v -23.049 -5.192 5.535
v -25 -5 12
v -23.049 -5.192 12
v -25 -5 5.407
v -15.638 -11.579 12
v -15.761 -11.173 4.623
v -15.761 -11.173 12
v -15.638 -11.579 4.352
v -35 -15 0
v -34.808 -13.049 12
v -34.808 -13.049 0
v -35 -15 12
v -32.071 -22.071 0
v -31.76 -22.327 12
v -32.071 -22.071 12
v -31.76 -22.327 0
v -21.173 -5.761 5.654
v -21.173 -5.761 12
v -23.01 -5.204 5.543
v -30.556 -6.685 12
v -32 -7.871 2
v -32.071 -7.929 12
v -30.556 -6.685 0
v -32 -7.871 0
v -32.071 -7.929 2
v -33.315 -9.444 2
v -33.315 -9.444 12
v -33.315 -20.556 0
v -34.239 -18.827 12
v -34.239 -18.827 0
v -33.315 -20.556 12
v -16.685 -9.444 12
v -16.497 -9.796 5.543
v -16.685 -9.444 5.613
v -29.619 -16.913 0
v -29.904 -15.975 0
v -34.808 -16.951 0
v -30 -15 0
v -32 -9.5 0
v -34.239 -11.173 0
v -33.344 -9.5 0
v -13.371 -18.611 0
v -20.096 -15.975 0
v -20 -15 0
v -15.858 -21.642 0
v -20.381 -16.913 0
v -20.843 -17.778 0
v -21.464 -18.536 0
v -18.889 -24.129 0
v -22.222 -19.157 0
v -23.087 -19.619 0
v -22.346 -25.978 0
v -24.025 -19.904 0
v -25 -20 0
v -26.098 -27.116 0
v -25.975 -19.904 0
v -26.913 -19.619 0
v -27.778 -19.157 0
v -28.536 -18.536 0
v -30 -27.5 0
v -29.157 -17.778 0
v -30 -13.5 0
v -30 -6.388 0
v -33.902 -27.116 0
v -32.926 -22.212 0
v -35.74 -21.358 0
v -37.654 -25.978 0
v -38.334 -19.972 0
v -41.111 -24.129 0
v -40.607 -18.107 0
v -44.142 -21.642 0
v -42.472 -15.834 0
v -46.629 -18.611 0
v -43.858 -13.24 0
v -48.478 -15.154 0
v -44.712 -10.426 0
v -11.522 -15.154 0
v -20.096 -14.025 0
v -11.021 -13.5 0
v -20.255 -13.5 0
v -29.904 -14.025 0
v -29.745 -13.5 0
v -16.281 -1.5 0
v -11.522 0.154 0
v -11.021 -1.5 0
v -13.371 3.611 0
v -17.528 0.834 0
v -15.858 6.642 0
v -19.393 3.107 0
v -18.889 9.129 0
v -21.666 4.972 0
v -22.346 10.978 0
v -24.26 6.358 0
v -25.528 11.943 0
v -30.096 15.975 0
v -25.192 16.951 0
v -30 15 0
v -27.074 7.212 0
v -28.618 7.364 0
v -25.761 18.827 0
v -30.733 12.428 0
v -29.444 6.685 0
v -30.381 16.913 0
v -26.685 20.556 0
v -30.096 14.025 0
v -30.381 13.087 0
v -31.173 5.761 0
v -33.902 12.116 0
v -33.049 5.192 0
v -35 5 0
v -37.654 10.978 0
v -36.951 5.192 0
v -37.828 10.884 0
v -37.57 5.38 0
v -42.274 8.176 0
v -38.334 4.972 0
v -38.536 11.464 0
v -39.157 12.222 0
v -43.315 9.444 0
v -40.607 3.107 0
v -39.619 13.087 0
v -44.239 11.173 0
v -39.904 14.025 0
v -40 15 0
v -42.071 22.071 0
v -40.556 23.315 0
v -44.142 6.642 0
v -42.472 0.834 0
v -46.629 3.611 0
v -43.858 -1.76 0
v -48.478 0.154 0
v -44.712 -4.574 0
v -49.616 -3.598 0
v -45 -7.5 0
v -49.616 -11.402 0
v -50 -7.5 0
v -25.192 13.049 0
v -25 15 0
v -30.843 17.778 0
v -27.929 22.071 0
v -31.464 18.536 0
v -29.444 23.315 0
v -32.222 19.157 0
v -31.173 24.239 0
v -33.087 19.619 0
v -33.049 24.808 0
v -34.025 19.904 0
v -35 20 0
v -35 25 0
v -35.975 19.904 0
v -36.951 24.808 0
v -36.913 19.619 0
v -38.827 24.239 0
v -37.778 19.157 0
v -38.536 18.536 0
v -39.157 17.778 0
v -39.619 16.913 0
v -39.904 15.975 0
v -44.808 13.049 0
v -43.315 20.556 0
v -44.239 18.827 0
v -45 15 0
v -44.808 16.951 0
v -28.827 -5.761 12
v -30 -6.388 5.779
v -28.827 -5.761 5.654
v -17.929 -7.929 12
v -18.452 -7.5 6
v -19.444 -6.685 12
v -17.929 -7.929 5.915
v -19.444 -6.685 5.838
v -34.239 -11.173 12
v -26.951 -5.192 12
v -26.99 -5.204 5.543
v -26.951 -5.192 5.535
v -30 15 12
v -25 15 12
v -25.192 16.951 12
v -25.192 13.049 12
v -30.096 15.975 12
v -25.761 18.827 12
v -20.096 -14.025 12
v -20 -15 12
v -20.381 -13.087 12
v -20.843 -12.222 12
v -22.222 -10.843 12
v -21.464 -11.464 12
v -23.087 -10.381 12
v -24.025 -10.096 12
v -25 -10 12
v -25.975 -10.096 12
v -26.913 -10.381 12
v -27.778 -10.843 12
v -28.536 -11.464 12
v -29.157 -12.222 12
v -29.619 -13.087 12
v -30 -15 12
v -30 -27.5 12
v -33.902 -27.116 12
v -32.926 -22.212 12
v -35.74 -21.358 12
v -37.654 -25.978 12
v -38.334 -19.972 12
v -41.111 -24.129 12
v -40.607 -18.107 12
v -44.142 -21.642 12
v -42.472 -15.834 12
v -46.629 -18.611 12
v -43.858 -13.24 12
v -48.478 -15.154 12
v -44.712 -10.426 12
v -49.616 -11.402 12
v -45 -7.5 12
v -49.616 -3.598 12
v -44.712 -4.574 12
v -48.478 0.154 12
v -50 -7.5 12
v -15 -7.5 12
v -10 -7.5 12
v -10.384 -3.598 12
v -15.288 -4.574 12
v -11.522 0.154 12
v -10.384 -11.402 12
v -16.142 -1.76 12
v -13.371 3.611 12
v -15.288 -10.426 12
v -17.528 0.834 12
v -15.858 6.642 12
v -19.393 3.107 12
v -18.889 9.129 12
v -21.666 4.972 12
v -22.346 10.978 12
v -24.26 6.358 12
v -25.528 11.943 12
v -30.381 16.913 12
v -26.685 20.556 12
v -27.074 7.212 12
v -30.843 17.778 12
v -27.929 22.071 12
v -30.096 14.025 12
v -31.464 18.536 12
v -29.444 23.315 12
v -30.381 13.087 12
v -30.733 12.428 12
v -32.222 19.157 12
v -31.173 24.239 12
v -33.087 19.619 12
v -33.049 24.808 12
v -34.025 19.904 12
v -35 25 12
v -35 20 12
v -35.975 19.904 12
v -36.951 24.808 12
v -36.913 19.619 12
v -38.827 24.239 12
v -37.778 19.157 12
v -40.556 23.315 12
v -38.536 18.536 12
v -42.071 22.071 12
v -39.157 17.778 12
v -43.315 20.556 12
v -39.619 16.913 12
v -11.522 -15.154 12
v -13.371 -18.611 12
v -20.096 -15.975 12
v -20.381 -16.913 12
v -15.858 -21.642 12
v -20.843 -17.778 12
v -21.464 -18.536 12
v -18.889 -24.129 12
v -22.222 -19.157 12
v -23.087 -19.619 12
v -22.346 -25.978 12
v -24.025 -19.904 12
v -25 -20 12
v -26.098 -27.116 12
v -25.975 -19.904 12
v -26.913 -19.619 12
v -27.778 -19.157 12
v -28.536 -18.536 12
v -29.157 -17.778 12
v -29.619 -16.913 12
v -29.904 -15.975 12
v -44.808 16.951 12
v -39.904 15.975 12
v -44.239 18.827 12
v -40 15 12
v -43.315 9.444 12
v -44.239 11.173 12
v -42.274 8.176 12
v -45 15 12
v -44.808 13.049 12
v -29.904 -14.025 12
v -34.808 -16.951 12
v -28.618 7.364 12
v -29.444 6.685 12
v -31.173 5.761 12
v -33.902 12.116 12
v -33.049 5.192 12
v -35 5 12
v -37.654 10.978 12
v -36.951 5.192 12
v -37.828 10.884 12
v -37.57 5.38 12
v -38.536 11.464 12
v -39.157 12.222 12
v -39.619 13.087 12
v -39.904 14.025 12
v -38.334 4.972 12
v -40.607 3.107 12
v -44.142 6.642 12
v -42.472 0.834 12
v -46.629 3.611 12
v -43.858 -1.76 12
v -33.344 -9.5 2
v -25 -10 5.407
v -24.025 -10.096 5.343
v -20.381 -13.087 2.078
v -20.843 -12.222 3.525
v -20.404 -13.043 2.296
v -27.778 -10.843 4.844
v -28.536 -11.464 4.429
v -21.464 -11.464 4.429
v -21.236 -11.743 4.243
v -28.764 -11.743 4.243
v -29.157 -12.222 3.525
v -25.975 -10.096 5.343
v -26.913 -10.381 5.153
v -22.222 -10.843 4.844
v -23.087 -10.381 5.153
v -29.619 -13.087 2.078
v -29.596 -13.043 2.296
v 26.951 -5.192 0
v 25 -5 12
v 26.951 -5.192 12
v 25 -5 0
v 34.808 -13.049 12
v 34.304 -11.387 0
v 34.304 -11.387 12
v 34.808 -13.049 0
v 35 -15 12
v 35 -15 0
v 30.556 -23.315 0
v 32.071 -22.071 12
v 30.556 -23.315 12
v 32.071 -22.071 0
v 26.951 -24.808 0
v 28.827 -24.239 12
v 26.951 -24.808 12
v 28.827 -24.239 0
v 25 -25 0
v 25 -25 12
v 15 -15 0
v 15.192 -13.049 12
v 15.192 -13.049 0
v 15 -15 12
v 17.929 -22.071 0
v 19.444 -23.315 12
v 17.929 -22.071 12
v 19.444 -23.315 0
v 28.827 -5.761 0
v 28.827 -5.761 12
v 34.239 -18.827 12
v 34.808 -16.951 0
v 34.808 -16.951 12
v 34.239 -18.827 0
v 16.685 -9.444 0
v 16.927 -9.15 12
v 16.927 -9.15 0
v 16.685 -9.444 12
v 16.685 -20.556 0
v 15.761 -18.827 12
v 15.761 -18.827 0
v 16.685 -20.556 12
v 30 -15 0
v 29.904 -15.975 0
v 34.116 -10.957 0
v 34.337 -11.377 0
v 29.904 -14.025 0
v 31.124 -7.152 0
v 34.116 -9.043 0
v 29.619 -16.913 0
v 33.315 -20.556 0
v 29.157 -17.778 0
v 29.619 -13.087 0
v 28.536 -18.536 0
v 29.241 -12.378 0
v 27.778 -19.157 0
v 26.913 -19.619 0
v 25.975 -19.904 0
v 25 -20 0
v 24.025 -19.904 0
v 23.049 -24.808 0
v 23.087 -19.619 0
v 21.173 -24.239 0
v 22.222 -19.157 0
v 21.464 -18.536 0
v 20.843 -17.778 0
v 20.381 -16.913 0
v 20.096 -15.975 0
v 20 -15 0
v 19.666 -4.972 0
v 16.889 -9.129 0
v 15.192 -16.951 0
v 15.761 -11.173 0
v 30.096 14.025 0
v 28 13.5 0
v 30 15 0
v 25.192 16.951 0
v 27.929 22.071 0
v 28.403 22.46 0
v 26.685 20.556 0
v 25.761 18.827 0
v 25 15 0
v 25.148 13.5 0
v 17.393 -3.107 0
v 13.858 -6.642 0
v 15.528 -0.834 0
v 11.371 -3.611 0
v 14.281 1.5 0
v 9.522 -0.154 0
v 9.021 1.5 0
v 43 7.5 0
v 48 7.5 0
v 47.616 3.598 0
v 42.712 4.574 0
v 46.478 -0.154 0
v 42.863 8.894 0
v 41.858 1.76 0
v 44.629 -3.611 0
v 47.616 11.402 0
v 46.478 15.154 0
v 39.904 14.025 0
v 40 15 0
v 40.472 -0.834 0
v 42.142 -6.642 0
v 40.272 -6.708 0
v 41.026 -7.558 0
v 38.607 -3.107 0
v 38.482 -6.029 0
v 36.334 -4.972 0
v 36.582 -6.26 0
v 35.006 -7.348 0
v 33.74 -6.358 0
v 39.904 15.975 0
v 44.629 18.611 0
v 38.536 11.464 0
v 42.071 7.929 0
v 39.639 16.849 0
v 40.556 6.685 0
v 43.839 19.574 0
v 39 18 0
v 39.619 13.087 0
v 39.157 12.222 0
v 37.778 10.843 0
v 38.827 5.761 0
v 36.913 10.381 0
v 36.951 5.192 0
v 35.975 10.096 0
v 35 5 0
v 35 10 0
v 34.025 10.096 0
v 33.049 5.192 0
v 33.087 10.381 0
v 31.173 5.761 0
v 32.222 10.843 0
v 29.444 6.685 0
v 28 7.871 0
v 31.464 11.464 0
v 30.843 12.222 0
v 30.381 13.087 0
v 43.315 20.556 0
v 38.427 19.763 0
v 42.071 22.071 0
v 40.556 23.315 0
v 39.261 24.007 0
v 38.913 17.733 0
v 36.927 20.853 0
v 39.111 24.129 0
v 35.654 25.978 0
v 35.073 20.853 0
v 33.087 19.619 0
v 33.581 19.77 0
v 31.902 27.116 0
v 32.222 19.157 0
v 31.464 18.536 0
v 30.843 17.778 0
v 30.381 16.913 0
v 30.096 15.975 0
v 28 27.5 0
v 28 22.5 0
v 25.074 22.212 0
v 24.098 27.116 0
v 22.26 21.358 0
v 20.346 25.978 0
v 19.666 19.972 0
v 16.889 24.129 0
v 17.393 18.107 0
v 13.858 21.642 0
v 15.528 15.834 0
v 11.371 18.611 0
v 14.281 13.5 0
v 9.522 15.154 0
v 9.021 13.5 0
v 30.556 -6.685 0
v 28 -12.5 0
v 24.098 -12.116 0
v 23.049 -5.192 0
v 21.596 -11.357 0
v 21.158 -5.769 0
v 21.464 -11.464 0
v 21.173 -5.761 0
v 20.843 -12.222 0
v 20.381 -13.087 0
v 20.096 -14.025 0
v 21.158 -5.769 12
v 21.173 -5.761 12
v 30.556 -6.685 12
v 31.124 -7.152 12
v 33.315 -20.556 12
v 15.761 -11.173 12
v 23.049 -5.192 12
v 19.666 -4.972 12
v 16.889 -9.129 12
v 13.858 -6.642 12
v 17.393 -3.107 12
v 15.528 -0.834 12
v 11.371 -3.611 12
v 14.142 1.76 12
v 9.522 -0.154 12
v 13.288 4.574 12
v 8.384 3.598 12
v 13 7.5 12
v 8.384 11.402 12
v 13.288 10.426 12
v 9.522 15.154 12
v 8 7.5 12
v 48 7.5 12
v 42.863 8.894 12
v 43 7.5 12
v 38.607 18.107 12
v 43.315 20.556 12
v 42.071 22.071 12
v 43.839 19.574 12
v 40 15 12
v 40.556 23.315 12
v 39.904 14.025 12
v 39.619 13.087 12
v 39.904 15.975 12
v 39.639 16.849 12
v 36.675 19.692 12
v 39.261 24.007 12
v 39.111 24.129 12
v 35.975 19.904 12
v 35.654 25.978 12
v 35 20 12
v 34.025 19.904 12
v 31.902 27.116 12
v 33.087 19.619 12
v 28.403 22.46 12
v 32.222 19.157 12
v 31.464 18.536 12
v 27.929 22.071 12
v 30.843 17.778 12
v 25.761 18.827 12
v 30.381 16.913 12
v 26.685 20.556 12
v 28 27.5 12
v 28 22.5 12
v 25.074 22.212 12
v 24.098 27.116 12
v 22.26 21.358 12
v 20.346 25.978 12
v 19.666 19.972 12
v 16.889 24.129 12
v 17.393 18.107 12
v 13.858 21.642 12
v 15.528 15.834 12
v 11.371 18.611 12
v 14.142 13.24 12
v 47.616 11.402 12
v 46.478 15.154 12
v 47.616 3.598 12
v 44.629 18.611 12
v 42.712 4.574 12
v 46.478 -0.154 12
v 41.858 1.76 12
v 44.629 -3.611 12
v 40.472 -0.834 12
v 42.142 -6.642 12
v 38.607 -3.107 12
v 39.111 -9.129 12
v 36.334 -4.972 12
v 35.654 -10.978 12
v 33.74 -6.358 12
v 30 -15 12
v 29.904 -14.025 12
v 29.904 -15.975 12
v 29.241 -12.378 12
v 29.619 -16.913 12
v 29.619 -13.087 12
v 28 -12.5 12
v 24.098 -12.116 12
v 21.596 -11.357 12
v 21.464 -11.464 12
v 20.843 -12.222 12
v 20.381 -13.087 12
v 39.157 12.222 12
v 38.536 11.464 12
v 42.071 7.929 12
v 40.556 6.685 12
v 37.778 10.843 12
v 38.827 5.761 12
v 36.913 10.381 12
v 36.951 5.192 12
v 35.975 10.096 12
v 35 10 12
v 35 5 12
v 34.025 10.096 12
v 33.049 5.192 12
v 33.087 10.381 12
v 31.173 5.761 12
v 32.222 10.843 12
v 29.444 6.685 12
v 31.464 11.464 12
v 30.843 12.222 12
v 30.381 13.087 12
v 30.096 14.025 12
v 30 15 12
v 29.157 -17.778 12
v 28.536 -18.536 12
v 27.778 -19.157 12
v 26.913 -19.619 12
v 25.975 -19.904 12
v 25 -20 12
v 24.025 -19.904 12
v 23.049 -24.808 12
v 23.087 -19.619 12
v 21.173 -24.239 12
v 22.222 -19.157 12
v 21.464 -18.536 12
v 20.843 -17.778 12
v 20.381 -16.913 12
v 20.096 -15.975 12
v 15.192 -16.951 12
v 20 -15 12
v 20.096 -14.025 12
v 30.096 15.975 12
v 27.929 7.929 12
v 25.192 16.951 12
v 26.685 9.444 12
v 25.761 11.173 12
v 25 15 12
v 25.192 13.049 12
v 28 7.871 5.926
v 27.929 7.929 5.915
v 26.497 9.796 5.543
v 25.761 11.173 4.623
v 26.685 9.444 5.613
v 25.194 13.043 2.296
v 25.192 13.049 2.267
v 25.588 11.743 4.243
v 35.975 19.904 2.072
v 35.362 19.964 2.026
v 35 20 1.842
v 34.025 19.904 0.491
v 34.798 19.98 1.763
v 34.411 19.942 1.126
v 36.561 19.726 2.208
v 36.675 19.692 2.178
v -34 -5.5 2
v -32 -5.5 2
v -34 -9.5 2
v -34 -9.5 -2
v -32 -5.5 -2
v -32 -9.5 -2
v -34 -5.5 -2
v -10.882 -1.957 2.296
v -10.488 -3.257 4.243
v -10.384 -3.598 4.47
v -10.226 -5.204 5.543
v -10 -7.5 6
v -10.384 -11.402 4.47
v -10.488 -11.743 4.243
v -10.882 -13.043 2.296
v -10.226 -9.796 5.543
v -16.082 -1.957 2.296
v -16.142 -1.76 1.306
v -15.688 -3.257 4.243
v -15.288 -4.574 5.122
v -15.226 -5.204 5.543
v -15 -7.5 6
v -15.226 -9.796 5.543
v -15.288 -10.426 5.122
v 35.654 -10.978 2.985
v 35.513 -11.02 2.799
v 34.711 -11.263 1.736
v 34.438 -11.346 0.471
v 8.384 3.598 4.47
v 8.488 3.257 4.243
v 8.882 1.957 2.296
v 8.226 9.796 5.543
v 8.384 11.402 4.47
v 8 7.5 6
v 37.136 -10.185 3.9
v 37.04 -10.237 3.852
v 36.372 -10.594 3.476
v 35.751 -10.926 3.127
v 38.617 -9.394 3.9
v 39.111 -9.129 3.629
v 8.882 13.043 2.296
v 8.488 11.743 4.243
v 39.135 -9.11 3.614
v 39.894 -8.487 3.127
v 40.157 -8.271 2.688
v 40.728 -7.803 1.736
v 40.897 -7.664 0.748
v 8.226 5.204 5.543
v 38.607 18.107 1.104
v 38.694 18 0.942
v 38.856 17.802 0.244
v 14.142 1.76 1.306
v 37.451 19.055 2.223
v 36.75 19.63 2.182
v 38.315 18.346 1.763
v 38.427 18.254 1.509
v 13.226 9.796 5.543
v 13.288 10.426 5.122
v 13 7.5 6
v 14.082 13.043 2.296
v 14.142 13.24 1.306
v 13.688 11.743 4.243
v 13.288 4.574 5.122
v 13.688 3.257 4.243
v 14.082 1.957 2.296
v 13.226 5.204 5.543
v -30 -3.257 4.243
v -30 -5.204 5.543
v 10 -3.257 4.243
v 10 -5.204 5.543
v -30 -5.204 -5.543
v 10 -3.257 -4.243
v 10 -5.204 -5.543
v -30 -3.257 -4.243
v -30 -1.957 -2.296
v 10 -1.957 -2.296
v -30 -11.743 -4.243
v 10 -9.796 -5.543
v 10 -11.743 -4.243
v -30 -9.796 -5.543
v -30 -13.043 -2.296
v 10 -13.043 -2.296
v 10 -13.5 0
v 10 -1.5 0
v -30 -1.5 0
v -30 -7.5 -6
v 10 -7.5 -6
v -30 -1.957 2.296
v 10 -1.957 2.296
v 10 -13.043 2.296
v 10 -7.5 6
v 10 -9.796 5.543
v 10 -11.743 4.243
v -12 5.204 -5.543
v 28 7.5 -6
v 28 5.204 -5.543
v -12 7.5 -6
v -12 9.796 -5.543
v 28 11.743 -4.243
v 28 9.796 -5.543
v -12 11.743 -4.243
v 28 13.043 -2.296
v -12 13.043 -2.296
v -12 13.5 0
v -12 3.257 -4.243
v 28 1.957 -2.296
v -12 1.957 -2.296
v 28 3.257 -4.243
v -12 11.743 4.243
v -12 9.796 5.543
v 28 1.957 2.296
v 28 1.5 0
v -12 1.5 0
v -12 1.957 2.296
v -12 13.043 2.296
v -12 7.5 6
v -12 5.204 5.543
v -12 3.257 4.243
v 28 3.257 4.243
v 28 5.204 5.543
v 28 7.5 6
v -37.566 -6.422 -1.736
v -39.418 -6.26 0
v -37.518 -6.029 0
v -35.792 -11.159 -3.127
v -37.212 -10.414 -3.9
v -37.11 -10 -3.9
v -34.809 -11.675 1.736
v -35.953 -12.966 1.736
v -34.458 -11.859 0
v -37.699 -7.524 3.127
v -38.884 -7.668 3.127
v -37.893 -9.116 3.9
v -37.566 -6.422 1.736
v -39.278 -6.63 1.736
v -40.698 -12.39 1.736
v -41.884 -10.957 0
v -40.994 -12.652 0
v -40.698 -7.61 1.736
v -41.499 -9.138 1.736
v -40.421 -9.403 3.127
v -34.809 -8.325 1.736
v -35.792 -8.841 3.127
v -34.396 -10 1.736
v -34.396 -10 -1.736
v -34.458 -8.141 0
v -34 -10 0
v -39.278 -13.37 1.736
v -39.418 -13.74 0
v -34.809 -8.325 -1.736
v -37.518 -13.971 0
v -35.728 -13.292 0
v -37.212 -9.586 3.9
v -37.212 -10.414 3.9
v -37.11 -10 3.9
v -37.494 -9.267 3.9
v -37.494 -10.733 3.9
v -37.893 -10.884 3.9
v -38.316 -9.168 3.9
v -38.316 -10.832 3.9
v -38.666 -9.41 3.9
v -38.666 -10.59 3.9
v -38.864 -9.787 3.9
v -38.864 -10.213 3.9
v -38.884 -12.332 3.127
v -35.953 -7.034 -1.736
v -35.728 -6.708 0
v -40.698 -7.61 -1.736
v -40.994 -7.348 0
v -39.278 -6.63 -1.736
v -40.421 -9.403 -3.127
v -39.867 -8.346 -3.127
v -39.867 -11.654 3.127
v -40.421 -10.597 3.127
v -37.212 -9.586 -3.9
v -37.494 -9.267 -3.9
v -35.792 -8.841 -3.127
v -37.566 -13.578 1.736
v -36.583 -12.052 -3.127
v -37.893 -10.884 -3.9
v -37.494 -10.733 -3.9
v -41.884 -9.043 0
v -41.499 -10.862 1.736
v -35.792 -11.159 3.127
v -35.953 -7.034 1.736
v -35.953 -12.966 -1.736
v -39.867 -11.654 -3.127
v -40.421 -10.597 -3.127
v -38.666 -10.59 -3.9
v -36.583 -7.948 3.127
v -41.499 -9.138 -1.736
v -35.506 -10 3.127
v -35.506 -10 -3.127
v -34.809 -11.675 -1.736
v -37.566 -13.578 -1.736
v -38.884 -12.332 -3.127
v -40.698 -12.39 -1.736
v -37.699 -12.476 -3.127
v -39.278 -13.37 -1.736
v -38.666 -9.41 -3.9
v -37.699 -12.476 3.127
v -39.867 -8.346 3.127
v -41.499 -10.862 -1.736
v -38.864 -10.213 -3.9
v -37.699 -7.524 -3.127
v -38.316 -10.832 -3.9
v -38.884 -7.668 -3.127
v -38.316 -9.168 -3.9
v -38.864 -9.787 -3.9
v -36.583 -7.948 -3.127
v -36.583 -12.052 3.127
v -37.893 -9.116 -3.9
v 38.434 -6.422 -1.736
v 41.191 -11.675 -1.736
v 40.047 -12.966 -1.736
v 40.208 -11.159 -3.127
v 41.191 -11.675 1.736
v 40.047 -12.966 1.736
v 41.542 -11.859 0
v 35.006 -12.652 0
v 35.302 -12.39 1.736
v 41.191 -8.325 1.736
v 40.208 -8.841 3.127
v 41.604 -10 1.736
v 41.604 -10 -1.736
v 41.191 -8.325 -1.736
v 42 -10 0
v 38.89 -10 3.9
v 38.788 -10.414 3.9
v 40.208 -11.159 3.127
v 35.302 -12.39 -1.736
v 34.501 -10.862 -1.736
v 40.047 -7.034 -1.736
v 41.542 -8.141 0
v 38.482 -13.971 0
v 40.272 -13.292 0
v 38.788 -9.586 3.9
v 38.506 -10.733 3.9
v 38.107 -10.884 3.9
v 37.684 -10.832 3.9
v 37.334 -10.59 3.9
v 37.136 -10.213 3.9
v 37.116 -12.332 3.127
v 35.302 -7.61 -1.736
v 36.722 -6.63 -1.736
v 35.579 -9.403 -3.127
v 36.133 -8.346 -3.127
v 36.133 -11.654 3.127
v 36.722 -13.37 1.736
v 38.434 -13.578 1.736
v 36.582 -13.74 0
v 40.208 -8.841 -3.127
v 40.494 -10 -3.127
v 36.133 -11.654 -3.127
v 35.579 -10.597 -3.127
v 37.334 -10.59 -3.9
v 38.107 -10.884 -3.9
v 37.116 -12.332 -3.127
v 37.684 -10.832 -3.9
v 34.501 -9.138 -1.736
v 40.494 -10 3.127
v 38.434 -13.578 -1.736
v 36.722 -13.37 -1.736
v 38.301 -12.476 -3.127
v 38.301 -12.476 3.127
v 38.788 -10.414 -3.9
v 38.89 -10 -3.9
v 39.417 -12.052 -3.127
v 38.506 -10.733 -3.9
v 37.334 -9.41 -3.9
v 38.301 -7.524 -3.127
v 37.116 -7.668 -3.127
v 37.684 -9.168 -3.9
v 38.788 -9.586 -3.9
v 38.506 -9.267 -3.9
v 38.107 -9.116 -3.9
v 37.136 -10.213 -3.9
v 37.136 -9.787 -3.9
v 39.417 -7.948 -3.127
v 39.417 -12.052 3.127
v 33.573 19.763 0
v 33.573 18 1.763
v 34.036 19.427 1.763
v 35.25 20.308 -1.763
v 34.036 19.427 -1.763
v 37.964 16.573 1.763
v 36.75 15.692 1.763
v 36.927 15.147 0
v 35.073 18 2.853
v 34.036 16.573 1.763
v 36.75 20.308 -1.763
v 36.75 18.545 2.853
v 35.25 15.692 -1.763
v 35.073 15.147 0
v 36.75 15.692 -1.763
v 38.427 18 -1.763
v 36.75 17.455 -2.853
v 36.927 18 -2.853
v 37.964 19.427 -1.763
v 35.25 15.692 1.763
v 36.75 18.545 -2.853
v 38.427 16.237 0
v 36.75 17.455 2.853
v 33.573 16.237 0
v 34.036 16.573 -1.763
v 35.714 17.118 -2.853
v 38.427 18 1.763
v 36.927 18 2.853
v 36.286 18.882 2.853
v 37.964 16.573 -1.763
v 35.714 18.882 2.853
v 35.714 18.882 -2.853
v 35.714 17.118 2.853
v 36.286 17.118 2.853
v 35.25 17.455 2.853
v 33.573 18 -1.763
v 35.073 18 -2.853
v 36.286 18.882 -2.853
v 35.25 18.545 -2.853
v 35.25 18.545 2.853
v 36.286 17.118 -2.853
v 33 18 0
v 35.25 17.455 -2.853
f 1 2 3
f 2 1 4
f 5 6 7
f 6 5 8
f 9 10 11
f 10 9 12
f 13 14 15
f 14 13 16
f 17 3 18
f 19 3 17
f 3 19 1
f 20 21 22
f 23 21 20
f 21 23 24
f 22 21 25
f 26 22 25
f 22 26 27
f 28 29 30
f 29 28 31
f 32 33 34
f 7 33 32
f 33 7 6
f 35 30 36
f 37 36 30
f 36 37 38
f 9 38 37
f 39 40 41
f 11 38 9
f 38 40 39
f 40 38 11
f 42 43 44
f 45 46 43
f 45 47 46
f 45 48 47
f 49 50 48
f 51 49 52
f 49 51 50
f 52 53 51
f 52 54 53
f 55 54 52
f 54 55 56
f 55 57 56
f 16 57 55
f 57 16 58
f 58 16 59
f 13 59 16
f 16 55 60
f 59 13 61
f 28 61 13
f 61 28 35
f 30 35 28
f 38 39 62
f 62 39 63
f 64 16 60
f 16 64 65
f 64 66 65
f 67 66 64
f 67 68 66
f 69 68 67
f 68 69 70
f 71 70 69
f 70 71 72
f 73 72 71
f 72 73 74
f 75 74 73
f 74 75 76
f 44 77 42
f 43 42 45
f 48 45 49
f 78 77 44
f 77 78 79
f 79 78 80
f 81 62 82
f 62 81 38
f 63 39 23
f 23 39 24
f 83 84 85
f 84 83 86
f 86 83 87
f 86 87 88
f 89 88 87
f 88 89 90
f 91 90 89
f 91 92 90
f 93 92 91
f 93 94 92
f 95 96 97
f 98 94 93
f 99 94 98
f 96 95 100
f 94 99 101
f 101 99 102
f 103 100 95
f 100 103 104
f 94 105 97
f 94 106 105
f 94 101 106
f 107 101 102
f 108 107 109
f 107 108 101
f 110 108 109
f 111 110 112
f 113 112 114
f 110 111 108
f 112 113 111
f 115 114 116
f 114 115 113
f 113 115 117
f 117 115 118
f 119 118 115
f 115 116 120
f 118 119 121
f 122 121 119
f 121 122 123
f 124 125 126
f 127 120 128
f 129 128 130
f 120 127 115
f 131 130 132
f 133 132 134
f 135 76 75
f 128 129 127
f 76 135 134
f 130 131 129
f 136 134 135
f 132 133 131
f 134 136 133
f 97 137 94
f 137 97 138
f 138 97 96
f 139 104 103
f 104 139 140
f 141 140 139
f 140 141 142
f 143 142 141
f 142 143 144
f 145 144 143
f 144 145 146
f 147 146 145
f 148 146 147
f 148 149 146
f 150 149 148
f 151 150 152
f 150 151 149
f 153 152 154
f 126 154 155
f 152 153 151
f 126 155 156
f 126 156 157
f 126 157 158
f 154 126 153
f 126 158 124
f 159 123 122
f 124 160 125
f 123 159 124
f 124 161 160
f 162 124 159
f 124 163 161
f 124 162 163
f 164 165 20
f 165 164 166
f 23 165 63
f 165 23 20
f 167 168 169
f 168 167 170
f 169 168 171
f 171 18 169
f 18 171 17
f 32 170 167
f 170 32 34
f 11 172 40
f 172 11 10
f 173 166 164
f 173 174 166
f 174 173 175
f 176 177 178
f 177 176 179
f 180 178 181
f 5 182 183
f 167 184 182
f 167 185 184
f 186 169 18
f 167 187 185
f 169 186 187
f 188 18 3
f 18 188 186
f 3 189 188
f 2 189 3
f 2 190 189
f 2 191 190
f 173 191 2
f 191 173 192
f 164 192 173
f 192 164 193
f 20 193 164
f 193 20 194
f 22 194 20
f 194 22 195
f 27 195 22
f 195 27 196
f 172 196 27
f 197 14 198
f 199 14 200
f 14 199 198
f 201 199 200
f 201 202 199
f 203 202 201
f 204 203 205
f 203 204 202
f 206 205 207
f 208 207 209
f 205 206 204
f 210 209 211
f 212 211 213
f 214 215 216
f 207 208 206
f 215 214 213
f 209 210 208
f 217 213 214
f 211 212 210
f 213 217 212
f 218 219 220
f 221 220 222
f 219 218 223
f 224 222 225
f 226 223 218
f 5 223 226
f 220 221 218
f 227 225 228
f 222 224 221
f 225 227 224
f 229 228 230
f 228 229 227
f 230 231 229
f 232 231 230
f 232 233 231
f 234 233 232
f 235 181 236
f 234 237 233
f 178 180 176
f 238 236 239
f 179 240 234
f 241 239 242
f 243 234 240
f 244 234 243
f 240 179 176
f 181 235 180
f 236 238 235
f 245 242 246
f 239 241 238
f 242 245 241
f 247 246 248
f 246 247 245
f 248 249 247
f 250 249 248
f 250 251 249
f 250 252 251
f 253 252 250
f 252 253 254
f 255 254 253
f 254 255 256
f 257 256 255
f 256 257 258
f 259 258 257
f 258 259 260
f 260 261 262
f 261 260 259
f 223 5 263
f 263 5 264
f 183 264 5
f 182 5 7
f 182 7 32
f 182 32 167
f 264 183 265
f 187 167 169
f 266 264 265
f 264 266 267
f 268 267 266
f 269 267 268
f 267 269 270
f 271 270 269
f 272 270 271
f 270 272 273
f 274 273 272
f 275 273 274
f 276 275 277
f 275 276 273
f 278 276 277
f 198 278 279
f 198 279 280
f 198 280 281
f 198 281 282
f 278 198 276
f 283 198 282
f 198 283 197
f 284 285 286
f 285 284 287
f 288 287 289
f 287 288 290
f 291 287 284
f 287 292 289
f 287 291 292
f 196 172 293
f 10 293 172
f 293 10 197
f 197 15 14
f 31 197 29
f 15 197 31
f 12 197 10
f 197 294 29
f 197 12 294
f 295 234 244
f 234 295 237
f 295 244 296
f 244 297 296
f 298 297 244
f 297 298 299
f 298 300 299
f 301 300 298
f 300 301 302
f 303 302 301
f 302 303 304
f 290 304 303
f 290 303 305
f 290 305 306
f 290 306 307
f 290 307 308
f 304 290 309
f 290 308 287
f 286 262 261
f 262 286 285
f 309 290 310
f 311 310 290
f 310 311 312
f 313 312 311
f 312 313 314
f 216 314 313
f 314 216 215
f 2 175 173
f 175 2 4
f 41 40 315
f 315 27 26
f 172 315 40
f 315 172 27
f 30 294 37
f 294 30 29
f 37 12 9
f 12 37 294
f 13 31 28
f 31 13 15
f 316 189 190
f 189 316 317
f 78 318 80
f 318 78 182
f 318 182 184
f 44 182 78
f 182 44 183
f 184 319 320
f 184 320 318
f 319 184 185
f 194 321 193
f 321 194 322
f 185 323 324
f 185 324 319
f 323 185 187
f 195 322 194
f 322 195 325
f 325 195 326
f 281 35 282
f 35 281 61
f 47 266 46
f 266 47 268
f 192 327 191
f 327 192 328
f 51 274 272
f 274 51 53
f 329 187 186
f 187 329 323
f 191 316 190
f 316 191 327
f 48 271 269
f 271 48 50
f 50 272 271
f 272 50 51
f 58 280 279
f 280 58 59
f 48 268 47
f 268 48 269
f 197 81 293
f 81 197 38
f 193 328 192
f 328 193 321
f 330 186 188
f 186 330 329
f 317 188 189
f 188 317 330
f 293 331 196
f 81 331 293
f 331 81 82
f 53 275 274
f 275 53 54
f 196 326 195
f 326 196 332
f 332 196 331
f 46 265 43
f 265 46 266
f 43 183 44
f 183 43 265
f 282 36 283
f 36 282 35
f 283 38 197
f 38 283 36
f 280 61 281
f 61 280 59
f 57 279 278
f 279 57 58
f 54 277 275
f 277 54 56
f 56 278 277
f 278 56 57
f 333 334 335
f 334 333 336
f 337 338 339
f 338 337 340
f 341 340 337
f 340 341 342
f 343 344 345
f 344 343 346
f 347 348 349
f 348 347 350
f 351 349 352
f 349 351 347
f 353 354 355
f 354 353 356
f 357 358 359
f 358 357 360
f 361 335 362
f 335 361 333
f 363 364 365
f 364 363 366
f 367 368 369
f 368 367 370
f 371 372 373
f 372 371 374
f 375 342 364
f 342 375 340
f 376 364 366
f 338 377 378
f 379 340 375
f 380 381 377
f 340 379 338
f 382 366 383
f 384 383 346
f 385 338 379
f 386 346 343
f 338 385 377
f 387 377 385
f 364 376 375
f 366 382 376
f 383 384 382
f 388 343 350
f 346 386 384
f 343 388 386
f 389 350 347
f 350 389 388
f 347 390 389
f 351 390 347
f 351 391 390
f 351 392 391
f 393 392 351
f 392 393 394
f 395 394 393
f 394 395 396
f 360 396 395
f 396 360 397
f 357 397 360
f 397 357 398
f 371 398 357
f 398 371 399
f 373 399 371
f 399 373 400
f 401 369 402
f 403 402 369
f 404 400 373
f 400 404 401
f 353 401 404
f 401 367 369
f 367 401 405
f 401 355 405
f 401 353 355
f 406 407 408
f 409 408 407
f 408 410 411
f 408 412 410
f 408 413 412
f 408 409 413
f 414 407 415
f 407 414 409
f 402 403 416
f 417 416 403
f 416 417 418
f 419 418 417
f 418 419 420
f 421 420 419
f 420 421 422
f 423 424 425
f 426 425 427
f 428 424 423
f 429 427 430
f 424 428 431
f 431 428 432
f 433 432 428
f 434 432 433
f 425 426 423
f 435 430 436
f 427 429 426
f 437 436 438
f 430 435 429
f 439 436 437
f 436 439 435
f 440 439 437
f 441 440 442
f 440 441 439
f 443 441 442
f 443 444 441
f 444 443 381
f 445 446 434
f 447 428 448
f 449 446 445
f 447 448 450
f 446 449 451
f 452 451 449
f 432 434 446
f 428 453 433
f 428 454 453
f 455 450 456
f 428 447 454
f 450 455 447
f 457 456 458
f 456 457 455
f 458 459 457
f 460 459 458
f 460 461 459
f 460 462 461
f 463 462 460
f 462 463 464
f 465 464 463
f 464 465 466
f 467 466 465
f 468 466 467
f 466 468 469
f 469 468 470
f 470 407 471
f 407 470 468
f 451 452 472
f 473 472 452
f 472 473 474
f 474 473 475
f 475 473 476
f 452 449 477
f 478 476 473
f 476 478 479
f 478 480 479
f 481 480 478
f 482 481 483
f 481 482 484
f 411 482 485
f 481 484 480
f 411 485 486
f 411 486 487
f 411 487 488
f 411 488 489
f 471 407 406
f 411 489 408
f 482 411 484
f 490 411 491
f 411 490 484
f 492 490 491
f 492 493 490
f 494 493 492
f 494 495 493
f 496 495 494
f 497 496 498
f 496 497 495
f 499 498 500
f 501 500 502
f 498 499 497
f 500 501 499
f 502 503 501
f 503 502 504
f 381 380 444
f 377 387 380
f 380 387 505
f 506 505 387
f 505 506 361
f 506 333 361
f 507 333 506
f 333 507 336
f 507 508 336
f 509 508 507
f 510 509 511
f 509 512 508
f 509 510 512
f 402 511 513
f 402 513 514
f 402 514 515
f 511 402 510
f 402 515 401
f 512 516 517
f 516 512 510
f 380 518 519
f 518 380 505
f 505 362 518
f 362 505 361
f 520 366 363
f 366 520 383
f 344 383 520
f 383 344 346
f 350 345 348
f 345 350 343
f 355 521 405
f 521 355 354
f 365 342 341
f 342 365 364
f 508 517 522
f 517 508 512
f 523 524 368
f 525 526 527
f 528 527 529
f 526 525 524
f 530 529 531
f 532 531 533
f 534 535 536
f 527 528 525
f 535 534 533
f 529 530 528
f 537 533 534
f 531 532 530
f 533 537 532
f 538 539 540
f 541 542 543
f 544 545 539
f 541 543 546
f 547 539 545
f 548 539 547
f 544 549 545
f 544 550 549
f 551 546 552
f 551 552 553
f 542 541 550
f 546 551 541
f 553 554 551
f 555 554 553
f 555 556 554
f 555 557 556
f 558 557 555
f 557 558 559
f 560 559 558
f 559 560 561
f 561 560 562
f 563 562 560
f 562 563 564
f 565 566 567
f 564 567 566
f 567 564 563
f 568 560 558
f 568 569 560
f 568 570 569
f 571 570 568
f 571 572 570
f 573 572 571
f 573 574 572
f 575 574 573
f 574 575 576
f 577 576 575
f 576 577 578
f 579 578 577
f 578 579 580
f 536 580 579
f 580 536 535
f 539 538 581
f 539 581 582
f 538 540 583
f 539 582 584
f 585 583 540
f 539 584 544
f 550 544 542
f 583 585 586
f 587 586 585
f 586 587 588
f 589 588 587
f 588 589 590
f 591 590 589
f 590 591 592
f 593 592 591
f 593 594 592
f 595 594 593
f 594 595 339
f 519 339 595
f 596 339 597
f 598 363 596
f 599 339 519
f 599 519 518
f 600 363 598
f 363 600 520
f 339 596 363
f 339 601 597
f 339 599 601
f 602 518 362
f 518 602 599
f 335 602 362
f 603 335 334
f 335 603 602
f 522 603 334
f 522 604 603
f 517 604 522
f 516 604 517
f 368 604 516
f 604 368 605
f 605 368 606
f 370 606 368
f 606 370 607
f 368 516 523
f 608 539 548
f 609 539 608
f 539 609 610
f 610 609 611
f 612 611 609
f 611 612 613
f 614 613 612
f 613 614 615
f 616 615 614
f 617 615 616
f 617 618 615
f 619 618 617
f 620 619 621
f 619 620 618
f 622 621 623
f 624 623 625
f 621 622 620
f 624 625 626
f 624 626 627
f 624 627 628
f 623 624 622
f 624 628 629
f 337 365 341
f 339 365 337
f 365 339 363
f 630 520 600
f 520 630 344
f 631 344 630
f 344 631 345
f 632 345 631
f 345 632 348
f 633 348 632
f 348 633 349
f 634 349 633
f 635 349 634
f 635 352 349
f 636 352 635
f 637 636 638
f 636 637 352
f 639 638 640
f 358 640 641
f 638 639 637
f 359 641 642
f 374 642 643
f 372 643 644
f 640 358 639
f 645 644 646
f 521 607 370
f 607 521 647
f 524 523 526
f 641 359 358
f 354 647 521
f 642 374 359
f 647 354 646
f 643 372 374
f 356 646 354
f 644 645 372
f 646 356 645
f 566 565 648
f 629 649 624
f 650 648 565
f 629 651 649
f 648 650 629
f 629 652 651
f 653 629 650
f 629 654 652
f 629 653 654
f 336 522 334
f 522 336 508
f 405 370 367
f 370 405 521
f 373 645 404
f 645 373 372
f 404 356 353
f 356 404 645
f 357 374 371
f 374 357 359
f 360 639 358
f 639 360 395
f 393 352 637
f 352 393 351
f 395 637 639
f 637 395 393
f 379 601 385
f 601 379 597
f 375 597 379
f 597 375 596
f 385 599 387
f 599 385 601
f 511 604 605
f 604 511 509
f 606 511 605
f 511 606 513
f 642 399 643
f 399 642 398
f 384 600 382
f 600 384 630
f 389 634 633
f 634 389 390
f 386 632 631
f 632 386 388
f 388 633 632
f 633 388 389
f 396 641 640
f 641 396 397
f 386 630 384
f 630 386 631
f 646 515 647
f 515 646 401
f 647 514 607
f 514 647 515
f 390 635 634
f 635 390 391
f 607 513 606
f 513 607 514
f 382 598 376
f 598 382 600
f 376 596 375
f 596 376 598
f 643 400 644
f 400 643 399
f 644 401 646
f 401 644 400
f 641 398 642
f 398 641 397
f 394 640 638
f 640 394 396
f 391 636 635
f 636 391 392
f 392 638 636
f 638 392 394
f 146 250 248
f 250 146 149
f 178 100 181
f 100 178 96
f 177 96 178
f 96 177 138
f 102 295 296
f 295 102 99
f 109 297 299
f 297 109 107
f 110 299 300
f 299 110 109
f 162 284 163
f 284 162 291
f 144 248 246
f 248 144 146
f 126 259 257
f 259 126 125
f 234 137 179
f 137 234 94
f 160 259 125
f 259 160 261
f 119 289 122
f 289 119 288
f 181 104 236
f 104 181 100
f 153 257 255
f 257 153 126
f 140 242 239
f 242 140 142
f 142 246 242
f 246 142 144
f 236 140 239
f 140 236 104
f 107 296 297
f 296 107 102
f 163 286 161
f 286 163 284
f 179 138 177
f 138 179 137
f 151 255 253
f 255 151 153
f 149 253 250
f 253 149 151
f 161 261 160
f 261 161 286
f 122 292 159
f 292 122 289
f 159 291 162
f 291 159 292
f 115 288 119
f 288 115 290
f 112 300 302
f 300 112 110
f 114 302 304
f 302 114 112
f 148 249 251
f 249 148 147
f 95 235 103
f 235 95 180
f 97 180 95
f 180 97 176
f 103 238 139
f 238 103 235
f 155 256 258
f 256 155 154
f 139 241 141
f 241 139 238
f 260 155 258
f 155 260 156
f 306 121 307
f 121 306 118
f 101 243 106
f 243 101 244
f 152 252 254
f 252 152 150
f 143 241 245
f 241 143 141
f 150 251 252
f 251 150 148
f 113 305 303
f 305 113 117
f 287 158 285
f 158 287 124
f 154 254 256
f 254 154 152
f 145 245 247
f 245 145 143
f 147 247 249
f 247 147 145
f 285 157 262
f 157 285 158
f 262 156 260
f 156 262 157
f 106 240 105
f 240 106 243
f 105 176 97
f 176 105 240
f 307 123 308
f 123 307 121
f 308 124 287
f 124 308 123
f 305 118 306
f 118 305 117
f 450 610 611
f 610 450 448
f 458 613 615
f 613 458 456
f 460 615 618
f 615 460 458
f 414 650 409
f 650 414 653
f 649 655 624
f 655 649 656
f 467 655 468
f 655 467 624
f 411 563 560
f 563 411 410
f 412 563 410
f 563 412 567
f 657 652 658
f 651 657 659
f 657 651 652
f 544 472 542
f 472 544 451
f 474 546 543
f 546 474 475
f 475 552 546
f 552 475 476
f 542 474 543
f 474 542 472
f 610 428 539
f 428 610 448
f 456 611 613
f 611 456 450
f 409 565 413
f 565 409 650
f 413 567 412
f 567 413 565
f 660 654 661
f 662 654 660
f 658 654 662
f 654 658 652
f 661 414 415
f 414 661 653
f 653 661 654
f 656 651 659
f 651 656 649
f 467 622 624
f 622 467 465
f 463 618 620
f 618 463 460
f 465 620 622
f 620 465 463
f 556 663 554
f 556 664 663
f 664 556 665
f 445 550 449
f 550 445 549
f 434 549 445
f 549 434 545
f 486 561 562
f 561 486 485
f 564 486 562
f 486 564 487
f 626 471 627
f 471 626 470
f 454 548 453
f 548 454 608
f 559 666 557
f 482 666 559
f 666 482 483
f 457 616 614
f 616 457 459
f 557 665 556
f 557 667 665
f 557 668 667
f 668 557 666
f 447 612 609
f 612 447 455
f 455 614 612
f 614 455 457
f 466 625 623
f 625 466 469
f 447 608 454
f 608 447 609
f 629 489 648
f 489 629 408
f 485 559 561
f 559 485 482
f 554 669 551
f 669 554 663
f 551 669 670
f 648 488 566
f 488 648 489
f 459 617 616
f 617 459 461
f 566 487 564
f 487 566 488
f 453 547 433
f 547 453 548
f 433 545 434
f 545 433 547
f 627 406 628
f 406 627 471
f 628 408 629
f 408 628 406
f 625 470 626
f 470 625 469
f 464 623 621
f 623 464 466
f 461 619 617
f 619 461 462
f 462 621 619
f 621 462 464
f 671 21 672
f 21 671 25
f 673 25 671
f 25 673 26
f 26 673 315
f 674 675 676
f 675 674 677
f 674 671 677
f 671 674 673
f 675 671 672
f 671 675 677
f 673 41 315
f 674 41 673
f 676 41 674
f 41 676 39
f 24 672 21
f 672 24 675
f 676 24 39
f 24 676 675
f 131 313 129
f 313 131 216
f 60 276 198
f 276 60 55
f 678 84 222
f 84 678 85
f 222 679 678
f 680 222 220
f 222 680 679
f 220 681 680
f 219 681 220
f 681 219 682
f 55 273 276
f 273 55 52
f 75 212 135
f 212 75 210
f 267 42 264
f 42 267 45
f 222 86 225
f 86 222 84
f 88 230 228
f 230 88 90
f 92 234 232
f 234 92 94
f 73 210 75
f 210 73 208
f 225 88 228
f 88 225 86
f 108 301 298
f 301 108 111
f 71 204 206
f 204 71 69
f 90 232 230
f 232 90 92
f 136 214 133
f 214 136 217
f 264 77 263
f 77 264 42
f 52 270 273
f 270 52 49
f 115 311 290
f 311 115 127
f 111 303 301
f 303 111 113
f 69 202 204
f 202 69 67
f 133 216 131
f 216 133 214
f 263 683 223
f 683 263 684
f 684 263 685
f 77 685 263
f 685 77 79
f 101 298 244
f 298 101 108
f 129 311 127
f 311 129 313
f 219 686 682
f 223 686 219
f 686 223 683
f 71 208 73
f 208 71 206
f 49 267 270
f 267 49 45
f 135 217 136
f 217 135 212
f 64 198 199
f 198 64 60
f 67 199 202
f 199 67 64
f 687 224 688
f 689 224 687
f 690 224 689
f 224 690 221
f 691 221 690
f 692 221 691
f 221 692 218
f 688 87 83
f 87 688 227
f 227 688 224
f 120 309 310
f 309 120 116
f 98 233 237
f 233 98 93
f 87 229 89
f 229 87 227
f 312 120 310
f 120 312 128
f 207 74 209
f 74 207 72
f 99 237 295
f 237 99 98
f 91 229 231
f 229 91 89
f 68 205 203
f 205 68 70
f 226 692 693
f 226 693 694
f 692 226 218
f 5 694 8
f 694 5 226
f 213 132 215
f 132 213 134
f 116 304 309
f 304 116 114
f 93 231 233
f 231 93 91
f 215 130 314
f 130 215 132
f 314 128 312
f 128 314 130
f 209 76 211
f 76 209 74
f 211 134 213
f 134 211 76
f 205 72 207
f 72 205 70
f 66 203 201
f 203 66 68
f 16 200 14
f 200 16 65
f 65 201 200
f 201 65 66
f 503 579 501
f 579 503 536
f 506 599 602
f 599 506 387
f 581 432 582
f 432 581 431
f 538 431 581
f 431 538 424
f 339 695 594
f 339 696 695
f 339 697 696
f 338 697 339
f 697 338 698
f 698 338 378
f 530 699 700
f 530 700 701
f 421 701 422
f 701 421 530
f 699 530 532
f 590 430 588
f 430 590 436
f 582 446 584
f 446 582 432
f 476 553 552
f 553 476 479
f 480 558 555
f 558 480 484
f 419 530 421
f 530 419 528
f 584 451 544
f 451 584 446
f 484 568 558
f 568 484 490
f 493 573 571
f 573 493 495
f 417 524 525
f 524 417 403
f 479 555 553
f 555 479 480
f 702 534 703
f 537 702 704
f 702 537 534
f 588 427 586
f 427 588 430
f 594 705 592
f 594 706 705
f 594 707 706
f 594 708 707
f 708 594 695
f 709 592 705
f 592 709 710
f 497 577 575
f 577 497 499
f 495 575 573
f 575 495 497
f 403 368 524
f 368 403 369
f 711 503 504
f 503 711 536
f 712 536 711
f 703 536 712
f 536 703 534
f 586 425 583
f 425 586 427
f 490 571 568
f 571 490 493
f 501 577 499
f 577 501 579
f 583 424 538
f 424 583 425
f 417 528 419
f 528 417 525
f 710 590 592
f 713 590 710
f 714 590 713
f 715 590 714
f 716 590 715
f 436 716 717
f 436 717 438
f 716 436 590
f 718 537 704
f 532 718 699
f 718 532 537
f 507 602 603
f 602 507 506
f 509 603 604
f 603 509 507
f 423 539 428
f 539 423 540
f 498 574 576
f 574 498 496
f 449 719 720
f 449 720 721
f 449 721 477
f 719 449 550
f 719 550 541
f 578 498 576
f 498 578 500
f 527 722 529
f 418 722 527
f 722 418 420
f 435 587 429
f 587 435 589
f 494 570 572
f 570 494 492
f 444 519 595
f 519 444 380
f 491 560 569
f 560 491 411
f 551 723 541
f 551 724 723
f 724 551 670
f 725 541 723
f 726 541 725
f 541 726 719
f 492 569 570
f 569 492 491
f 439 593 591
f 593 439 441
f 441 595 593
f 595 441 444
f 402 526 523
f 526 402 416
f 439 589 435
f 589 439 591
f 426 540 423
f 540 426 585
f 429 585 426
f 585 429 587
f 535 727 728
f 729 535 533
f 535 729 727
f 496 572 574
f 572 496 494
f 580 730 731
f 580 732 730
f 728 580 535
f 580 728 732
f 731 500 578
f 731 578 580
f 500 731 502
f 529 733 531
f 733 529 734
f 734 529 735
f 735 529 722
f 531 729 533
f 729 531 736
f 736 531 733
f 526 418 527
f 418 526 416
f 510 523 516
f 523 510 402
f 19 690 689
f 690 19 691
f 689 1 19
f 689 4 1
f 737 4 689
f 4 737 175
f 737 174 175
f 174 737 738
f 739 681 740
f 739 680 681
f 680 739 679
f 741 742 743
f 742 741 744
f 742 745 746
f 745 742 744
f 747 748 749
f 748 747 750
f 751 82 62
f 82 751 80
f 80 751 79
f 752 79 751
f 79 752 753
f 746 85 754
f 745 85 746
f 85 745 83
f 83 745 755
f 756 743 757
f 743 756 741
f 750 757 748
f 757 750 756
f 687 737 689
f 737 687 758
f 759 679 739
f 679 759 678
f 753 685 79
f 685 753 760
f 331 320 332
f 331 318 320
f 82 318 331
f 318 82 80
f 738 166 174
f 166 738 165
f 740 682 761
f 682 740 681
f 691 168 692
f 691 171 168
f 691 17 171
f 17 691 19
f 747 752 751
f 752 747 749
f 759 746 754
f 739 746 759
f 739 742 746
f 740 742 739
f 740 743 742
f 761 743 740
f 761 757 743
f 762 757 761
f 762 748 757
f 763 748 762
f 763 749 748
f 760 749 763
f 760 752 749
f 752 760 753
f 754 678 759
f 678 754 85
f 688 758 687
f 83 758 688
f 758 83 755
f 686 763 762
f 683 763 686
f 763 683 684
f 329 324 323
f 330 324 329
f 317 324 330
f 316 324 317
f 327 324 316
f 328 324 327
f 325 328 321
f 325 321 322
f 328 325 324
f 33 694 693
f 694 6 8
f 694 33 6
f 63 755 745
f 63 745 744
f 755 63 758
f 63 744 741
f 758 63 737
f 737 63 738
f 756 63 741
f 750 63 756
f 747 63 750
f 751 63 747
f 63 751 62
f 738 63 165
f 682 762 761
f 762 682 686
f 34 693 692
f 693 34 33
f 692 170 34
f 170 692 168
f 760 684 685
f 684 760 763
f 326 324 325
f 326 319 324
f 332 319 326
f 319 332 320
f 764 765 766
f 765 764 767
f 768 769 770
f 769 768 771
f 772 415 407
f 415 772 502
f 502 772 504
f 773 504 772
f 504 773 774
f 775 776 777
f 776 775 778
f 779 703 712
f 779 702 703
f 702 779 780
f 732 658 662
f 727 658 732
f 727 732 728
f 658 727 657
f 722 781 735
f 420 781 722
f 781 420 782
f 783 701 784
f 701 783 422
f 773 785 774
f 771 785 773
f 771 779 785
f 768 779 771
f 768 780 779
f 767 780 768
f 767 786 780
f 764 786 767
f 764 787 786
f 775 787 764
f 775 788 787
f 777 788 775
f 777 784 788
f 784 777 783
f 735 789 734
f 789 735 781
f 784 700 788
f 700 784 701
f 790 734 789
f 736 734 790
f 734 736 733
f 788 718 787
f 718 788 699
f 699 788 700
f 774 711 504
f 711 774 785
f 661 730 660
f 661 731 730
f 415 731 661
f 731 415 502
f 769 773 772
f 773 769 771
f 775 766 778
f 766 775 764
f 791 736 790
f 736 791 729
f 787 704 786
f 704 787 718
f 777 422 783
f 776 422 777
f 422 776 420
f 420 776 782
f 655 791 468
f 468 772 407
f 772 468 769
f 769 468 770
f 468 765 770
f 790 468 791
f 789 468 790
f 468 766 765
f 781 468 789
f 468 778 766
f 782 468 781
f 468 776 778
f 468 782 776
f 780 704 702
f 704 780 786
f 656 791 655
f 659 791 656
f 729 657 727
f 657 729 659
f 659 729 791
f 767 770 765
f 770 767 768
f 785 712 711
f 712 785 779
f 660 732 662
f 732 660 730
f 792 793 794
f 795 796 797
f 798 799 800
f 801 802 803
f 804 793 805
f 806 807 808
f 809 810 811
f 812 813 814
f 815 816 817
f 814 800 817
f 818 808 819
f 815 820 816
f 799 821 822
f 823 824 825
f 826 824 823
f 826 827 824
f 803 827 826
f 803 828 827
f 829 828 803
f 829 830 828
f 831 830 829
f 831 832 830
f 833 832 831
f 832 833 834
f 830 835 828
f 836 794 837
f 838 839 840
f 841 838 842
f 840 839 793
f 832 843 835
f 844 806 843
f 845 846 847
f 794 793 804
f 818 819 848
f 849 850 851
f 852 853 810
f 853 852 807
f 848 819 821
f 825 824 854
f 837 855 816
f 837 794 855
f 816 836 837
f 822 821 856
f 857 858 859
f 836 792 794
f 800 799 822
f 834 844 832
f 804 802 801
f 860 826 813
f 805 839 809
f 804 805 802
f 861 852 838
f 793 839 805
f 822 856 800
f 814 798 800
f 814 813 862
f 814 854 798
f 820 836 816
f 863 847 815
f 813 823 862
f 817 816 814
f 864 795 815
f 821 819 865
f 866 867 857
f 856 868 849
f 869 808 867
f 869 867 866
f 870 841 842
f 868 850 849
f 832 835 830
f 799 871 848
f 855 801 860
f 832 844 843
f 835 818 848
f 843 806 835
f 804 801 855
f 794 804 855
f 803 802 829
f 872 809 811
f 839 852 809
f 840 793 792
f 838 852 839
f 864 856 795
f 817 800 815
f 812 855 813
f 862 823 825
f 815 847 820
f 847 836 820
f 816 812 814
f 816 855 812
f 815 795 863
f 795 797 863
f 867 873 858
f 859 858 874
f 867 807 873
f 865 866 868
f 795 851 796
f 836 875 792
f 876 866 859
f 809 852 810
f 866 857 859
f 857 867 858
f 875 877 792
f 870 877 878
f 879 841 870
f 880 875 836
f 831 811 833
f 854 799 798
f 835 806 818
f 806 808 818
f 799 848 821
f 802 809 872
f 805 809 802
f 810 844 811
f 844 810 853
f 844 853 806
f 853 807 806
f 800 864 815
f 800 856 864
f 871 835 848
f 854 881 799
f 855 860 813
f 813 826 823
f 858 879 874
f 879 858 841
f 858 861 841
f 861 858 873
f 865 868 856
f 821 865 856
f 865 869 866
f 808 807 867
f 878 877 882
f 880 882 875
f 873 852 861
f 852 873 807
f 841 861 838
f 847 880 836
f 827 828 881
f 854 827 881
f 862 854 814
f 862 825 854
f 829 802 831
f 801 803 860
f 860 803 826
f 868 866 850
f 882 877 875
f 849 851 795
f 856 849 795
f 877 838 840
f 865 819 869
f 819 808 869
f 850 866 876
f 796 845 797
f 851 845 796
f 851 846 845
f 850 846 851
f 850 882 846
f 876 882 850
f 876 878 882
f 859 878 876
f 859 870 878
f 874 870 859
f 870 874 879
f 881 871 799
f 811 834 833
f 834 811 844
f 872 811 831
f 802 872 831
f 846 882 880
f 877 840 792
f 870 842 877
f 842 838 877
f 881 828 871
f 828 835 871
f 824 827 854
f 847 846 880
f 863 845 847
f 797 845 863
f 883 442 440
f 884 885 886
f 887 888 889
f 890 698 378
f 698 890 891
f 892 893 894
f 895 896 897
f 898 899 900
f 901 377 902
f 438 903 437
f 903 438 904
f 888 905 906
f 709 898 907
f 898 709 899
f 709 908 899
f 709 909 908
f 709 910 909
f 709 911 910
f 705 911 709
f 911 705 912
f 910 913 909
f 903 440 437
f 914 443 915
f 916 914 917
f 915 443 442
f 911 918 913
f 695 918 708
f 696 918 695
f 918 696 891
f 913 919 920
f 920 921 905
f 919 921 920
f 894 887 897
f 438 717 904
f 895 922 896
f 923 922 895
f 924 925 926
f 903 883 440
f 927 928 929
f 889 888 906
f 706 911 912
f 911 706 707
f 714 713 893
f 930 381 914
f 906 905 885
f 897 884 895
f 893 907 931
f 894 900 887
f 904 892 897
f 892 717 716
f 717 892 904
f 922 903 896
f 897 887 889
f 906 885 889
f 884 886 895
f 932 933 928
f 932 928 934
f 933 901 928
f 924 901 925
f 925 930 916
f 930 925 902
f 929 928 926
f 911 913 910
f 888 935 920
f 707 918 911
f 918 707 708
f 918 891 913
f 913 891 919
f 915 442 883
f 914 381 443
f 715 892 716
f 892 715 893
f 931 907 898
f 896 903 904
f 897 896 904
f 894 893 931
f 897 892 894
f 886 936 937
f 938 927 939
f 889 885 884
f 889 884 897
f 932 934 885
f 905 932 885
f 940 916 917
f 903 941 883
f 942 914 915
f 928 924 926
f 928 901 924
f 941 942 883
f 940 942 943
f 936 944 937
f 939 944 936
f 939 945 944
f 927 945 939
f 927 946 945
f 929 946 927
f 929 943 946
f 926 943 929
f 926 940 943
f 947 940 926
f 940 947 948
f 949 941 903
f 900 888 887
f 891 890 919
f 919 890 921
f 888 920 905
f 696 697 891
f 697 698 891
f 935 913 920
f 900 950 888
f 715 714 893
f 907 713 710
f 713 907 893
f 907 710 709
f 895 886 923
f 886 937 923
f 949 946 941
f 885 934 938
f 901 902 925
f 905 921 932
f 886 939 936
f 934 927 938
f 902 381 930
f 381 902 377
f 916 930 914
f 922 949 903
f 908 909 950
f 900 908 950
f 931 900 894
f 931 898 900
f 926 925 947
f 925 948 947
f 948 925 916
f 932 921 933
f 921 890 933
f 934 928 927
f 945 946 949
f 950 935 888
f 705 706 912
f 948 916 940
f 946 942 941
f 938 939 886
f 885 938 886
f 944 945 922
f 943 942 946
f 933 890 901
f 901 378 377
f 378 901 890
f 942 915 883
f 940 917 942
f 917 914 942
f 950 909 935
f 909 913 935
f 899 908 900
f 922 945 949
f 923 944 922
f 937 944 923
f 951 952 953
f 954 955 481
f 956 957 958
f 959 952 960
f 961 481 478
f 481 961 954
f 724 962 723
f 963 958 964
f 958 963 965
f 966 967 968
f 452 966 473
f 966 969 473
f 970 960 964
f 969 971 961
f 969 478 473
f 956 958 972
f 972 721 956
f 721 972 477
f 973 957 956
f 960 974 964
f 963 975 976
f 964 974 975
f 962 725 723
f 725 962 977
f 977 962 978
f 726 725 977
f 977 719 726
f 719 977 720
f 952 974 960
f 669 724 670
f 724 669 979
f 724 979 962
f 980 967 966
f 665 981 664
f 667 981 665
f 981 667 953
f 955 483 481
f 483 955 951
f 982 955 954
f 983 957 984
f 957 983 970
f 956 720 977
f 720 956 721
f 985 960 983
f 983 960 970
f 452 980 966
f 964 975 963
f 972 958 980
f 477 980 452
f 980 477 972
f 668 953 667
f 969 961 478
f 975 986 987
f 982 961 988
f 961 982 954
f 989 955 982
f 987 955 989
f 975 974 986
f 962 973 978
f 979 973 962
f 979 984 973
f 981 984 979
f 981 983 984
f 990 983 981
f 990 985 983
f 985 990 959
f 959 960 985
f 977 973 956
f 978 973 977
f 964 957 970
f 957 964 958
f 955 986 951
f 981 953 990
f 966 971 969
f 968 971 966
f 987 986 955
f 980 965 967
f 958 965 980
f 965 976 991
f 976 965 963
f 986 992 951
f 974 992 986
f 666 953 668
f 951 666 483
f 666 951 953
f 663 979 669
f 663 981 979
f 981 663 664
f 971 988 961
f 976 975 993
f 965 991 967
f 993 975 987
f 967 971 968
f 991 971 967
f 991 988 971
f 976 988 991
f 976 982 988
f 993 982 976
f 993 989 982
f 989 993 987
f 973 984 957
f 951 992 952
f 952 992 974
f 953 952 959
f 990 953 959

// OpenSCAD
// Generated by CadMonkey
// Prompt: hey cadmonkey, create me a car
// Generated at: 2025-11-11 05:52:36

// Car model built from primitives
// Dimensions in mm (scaled to ~70mm length)

// Overall scale factor
scale_factor = 1;

// Wheel module
module wheel(radius=20, width=12) {
    difference() {
        cylinder(h=width, r=radius, $fn=32);
        translate([0,0,-1])
            cylinder(h=width+2, r=radius-5, $fn=32);
    }
}

// Tire module
module tire(width=8) {
    color("black")
    difference() {
        cube([width, width/2, width/2], center=true);
        translate([-width/4, -width/4, -width/4])
            cube([width*2, width*2, width]);
    }
}

// Main assembly
scale(scale_factor)
union() {

    // Front left wheel
    translate([-25, -15, 0]) wheel(10);

    // Front right wheel
    translate([25, -15, 0]) wheel(10);

    // Rear left wheel
    translate([-35, 15, 0]) wheel(10);

    // Rear right wheel
    translate([35, 15, 0]) wheel(10);

    // Front axle
    translate([-30, -7.5, 0]) rotate([0,90,0])
        cylinder(h=40, r=6, $fn=16);

    // Rear axle
    translate([28, 7.5, 0]) rotate([0,90,180])
        cylinder(h=40, r=6, $fn=16);

    // Front wheels
    translate([-30, -7.5, 0]) tire();
    translate([-30, -7.5, 0]) wheel();

    // Rear wheels
    translate([28, 7.5, 0]) tire();
    translate([28, 7.5, 0]) wheel();

    // Headlights
    translate([-38, -10, 0]) sphere(r=4);
    translate([38, -10, 0]) sphere(r=4);

    // Taillights
    translate([36, 18, 0]) sphere(r=3);
    translate([36, 18, 0]) sphere(r=3);
}
